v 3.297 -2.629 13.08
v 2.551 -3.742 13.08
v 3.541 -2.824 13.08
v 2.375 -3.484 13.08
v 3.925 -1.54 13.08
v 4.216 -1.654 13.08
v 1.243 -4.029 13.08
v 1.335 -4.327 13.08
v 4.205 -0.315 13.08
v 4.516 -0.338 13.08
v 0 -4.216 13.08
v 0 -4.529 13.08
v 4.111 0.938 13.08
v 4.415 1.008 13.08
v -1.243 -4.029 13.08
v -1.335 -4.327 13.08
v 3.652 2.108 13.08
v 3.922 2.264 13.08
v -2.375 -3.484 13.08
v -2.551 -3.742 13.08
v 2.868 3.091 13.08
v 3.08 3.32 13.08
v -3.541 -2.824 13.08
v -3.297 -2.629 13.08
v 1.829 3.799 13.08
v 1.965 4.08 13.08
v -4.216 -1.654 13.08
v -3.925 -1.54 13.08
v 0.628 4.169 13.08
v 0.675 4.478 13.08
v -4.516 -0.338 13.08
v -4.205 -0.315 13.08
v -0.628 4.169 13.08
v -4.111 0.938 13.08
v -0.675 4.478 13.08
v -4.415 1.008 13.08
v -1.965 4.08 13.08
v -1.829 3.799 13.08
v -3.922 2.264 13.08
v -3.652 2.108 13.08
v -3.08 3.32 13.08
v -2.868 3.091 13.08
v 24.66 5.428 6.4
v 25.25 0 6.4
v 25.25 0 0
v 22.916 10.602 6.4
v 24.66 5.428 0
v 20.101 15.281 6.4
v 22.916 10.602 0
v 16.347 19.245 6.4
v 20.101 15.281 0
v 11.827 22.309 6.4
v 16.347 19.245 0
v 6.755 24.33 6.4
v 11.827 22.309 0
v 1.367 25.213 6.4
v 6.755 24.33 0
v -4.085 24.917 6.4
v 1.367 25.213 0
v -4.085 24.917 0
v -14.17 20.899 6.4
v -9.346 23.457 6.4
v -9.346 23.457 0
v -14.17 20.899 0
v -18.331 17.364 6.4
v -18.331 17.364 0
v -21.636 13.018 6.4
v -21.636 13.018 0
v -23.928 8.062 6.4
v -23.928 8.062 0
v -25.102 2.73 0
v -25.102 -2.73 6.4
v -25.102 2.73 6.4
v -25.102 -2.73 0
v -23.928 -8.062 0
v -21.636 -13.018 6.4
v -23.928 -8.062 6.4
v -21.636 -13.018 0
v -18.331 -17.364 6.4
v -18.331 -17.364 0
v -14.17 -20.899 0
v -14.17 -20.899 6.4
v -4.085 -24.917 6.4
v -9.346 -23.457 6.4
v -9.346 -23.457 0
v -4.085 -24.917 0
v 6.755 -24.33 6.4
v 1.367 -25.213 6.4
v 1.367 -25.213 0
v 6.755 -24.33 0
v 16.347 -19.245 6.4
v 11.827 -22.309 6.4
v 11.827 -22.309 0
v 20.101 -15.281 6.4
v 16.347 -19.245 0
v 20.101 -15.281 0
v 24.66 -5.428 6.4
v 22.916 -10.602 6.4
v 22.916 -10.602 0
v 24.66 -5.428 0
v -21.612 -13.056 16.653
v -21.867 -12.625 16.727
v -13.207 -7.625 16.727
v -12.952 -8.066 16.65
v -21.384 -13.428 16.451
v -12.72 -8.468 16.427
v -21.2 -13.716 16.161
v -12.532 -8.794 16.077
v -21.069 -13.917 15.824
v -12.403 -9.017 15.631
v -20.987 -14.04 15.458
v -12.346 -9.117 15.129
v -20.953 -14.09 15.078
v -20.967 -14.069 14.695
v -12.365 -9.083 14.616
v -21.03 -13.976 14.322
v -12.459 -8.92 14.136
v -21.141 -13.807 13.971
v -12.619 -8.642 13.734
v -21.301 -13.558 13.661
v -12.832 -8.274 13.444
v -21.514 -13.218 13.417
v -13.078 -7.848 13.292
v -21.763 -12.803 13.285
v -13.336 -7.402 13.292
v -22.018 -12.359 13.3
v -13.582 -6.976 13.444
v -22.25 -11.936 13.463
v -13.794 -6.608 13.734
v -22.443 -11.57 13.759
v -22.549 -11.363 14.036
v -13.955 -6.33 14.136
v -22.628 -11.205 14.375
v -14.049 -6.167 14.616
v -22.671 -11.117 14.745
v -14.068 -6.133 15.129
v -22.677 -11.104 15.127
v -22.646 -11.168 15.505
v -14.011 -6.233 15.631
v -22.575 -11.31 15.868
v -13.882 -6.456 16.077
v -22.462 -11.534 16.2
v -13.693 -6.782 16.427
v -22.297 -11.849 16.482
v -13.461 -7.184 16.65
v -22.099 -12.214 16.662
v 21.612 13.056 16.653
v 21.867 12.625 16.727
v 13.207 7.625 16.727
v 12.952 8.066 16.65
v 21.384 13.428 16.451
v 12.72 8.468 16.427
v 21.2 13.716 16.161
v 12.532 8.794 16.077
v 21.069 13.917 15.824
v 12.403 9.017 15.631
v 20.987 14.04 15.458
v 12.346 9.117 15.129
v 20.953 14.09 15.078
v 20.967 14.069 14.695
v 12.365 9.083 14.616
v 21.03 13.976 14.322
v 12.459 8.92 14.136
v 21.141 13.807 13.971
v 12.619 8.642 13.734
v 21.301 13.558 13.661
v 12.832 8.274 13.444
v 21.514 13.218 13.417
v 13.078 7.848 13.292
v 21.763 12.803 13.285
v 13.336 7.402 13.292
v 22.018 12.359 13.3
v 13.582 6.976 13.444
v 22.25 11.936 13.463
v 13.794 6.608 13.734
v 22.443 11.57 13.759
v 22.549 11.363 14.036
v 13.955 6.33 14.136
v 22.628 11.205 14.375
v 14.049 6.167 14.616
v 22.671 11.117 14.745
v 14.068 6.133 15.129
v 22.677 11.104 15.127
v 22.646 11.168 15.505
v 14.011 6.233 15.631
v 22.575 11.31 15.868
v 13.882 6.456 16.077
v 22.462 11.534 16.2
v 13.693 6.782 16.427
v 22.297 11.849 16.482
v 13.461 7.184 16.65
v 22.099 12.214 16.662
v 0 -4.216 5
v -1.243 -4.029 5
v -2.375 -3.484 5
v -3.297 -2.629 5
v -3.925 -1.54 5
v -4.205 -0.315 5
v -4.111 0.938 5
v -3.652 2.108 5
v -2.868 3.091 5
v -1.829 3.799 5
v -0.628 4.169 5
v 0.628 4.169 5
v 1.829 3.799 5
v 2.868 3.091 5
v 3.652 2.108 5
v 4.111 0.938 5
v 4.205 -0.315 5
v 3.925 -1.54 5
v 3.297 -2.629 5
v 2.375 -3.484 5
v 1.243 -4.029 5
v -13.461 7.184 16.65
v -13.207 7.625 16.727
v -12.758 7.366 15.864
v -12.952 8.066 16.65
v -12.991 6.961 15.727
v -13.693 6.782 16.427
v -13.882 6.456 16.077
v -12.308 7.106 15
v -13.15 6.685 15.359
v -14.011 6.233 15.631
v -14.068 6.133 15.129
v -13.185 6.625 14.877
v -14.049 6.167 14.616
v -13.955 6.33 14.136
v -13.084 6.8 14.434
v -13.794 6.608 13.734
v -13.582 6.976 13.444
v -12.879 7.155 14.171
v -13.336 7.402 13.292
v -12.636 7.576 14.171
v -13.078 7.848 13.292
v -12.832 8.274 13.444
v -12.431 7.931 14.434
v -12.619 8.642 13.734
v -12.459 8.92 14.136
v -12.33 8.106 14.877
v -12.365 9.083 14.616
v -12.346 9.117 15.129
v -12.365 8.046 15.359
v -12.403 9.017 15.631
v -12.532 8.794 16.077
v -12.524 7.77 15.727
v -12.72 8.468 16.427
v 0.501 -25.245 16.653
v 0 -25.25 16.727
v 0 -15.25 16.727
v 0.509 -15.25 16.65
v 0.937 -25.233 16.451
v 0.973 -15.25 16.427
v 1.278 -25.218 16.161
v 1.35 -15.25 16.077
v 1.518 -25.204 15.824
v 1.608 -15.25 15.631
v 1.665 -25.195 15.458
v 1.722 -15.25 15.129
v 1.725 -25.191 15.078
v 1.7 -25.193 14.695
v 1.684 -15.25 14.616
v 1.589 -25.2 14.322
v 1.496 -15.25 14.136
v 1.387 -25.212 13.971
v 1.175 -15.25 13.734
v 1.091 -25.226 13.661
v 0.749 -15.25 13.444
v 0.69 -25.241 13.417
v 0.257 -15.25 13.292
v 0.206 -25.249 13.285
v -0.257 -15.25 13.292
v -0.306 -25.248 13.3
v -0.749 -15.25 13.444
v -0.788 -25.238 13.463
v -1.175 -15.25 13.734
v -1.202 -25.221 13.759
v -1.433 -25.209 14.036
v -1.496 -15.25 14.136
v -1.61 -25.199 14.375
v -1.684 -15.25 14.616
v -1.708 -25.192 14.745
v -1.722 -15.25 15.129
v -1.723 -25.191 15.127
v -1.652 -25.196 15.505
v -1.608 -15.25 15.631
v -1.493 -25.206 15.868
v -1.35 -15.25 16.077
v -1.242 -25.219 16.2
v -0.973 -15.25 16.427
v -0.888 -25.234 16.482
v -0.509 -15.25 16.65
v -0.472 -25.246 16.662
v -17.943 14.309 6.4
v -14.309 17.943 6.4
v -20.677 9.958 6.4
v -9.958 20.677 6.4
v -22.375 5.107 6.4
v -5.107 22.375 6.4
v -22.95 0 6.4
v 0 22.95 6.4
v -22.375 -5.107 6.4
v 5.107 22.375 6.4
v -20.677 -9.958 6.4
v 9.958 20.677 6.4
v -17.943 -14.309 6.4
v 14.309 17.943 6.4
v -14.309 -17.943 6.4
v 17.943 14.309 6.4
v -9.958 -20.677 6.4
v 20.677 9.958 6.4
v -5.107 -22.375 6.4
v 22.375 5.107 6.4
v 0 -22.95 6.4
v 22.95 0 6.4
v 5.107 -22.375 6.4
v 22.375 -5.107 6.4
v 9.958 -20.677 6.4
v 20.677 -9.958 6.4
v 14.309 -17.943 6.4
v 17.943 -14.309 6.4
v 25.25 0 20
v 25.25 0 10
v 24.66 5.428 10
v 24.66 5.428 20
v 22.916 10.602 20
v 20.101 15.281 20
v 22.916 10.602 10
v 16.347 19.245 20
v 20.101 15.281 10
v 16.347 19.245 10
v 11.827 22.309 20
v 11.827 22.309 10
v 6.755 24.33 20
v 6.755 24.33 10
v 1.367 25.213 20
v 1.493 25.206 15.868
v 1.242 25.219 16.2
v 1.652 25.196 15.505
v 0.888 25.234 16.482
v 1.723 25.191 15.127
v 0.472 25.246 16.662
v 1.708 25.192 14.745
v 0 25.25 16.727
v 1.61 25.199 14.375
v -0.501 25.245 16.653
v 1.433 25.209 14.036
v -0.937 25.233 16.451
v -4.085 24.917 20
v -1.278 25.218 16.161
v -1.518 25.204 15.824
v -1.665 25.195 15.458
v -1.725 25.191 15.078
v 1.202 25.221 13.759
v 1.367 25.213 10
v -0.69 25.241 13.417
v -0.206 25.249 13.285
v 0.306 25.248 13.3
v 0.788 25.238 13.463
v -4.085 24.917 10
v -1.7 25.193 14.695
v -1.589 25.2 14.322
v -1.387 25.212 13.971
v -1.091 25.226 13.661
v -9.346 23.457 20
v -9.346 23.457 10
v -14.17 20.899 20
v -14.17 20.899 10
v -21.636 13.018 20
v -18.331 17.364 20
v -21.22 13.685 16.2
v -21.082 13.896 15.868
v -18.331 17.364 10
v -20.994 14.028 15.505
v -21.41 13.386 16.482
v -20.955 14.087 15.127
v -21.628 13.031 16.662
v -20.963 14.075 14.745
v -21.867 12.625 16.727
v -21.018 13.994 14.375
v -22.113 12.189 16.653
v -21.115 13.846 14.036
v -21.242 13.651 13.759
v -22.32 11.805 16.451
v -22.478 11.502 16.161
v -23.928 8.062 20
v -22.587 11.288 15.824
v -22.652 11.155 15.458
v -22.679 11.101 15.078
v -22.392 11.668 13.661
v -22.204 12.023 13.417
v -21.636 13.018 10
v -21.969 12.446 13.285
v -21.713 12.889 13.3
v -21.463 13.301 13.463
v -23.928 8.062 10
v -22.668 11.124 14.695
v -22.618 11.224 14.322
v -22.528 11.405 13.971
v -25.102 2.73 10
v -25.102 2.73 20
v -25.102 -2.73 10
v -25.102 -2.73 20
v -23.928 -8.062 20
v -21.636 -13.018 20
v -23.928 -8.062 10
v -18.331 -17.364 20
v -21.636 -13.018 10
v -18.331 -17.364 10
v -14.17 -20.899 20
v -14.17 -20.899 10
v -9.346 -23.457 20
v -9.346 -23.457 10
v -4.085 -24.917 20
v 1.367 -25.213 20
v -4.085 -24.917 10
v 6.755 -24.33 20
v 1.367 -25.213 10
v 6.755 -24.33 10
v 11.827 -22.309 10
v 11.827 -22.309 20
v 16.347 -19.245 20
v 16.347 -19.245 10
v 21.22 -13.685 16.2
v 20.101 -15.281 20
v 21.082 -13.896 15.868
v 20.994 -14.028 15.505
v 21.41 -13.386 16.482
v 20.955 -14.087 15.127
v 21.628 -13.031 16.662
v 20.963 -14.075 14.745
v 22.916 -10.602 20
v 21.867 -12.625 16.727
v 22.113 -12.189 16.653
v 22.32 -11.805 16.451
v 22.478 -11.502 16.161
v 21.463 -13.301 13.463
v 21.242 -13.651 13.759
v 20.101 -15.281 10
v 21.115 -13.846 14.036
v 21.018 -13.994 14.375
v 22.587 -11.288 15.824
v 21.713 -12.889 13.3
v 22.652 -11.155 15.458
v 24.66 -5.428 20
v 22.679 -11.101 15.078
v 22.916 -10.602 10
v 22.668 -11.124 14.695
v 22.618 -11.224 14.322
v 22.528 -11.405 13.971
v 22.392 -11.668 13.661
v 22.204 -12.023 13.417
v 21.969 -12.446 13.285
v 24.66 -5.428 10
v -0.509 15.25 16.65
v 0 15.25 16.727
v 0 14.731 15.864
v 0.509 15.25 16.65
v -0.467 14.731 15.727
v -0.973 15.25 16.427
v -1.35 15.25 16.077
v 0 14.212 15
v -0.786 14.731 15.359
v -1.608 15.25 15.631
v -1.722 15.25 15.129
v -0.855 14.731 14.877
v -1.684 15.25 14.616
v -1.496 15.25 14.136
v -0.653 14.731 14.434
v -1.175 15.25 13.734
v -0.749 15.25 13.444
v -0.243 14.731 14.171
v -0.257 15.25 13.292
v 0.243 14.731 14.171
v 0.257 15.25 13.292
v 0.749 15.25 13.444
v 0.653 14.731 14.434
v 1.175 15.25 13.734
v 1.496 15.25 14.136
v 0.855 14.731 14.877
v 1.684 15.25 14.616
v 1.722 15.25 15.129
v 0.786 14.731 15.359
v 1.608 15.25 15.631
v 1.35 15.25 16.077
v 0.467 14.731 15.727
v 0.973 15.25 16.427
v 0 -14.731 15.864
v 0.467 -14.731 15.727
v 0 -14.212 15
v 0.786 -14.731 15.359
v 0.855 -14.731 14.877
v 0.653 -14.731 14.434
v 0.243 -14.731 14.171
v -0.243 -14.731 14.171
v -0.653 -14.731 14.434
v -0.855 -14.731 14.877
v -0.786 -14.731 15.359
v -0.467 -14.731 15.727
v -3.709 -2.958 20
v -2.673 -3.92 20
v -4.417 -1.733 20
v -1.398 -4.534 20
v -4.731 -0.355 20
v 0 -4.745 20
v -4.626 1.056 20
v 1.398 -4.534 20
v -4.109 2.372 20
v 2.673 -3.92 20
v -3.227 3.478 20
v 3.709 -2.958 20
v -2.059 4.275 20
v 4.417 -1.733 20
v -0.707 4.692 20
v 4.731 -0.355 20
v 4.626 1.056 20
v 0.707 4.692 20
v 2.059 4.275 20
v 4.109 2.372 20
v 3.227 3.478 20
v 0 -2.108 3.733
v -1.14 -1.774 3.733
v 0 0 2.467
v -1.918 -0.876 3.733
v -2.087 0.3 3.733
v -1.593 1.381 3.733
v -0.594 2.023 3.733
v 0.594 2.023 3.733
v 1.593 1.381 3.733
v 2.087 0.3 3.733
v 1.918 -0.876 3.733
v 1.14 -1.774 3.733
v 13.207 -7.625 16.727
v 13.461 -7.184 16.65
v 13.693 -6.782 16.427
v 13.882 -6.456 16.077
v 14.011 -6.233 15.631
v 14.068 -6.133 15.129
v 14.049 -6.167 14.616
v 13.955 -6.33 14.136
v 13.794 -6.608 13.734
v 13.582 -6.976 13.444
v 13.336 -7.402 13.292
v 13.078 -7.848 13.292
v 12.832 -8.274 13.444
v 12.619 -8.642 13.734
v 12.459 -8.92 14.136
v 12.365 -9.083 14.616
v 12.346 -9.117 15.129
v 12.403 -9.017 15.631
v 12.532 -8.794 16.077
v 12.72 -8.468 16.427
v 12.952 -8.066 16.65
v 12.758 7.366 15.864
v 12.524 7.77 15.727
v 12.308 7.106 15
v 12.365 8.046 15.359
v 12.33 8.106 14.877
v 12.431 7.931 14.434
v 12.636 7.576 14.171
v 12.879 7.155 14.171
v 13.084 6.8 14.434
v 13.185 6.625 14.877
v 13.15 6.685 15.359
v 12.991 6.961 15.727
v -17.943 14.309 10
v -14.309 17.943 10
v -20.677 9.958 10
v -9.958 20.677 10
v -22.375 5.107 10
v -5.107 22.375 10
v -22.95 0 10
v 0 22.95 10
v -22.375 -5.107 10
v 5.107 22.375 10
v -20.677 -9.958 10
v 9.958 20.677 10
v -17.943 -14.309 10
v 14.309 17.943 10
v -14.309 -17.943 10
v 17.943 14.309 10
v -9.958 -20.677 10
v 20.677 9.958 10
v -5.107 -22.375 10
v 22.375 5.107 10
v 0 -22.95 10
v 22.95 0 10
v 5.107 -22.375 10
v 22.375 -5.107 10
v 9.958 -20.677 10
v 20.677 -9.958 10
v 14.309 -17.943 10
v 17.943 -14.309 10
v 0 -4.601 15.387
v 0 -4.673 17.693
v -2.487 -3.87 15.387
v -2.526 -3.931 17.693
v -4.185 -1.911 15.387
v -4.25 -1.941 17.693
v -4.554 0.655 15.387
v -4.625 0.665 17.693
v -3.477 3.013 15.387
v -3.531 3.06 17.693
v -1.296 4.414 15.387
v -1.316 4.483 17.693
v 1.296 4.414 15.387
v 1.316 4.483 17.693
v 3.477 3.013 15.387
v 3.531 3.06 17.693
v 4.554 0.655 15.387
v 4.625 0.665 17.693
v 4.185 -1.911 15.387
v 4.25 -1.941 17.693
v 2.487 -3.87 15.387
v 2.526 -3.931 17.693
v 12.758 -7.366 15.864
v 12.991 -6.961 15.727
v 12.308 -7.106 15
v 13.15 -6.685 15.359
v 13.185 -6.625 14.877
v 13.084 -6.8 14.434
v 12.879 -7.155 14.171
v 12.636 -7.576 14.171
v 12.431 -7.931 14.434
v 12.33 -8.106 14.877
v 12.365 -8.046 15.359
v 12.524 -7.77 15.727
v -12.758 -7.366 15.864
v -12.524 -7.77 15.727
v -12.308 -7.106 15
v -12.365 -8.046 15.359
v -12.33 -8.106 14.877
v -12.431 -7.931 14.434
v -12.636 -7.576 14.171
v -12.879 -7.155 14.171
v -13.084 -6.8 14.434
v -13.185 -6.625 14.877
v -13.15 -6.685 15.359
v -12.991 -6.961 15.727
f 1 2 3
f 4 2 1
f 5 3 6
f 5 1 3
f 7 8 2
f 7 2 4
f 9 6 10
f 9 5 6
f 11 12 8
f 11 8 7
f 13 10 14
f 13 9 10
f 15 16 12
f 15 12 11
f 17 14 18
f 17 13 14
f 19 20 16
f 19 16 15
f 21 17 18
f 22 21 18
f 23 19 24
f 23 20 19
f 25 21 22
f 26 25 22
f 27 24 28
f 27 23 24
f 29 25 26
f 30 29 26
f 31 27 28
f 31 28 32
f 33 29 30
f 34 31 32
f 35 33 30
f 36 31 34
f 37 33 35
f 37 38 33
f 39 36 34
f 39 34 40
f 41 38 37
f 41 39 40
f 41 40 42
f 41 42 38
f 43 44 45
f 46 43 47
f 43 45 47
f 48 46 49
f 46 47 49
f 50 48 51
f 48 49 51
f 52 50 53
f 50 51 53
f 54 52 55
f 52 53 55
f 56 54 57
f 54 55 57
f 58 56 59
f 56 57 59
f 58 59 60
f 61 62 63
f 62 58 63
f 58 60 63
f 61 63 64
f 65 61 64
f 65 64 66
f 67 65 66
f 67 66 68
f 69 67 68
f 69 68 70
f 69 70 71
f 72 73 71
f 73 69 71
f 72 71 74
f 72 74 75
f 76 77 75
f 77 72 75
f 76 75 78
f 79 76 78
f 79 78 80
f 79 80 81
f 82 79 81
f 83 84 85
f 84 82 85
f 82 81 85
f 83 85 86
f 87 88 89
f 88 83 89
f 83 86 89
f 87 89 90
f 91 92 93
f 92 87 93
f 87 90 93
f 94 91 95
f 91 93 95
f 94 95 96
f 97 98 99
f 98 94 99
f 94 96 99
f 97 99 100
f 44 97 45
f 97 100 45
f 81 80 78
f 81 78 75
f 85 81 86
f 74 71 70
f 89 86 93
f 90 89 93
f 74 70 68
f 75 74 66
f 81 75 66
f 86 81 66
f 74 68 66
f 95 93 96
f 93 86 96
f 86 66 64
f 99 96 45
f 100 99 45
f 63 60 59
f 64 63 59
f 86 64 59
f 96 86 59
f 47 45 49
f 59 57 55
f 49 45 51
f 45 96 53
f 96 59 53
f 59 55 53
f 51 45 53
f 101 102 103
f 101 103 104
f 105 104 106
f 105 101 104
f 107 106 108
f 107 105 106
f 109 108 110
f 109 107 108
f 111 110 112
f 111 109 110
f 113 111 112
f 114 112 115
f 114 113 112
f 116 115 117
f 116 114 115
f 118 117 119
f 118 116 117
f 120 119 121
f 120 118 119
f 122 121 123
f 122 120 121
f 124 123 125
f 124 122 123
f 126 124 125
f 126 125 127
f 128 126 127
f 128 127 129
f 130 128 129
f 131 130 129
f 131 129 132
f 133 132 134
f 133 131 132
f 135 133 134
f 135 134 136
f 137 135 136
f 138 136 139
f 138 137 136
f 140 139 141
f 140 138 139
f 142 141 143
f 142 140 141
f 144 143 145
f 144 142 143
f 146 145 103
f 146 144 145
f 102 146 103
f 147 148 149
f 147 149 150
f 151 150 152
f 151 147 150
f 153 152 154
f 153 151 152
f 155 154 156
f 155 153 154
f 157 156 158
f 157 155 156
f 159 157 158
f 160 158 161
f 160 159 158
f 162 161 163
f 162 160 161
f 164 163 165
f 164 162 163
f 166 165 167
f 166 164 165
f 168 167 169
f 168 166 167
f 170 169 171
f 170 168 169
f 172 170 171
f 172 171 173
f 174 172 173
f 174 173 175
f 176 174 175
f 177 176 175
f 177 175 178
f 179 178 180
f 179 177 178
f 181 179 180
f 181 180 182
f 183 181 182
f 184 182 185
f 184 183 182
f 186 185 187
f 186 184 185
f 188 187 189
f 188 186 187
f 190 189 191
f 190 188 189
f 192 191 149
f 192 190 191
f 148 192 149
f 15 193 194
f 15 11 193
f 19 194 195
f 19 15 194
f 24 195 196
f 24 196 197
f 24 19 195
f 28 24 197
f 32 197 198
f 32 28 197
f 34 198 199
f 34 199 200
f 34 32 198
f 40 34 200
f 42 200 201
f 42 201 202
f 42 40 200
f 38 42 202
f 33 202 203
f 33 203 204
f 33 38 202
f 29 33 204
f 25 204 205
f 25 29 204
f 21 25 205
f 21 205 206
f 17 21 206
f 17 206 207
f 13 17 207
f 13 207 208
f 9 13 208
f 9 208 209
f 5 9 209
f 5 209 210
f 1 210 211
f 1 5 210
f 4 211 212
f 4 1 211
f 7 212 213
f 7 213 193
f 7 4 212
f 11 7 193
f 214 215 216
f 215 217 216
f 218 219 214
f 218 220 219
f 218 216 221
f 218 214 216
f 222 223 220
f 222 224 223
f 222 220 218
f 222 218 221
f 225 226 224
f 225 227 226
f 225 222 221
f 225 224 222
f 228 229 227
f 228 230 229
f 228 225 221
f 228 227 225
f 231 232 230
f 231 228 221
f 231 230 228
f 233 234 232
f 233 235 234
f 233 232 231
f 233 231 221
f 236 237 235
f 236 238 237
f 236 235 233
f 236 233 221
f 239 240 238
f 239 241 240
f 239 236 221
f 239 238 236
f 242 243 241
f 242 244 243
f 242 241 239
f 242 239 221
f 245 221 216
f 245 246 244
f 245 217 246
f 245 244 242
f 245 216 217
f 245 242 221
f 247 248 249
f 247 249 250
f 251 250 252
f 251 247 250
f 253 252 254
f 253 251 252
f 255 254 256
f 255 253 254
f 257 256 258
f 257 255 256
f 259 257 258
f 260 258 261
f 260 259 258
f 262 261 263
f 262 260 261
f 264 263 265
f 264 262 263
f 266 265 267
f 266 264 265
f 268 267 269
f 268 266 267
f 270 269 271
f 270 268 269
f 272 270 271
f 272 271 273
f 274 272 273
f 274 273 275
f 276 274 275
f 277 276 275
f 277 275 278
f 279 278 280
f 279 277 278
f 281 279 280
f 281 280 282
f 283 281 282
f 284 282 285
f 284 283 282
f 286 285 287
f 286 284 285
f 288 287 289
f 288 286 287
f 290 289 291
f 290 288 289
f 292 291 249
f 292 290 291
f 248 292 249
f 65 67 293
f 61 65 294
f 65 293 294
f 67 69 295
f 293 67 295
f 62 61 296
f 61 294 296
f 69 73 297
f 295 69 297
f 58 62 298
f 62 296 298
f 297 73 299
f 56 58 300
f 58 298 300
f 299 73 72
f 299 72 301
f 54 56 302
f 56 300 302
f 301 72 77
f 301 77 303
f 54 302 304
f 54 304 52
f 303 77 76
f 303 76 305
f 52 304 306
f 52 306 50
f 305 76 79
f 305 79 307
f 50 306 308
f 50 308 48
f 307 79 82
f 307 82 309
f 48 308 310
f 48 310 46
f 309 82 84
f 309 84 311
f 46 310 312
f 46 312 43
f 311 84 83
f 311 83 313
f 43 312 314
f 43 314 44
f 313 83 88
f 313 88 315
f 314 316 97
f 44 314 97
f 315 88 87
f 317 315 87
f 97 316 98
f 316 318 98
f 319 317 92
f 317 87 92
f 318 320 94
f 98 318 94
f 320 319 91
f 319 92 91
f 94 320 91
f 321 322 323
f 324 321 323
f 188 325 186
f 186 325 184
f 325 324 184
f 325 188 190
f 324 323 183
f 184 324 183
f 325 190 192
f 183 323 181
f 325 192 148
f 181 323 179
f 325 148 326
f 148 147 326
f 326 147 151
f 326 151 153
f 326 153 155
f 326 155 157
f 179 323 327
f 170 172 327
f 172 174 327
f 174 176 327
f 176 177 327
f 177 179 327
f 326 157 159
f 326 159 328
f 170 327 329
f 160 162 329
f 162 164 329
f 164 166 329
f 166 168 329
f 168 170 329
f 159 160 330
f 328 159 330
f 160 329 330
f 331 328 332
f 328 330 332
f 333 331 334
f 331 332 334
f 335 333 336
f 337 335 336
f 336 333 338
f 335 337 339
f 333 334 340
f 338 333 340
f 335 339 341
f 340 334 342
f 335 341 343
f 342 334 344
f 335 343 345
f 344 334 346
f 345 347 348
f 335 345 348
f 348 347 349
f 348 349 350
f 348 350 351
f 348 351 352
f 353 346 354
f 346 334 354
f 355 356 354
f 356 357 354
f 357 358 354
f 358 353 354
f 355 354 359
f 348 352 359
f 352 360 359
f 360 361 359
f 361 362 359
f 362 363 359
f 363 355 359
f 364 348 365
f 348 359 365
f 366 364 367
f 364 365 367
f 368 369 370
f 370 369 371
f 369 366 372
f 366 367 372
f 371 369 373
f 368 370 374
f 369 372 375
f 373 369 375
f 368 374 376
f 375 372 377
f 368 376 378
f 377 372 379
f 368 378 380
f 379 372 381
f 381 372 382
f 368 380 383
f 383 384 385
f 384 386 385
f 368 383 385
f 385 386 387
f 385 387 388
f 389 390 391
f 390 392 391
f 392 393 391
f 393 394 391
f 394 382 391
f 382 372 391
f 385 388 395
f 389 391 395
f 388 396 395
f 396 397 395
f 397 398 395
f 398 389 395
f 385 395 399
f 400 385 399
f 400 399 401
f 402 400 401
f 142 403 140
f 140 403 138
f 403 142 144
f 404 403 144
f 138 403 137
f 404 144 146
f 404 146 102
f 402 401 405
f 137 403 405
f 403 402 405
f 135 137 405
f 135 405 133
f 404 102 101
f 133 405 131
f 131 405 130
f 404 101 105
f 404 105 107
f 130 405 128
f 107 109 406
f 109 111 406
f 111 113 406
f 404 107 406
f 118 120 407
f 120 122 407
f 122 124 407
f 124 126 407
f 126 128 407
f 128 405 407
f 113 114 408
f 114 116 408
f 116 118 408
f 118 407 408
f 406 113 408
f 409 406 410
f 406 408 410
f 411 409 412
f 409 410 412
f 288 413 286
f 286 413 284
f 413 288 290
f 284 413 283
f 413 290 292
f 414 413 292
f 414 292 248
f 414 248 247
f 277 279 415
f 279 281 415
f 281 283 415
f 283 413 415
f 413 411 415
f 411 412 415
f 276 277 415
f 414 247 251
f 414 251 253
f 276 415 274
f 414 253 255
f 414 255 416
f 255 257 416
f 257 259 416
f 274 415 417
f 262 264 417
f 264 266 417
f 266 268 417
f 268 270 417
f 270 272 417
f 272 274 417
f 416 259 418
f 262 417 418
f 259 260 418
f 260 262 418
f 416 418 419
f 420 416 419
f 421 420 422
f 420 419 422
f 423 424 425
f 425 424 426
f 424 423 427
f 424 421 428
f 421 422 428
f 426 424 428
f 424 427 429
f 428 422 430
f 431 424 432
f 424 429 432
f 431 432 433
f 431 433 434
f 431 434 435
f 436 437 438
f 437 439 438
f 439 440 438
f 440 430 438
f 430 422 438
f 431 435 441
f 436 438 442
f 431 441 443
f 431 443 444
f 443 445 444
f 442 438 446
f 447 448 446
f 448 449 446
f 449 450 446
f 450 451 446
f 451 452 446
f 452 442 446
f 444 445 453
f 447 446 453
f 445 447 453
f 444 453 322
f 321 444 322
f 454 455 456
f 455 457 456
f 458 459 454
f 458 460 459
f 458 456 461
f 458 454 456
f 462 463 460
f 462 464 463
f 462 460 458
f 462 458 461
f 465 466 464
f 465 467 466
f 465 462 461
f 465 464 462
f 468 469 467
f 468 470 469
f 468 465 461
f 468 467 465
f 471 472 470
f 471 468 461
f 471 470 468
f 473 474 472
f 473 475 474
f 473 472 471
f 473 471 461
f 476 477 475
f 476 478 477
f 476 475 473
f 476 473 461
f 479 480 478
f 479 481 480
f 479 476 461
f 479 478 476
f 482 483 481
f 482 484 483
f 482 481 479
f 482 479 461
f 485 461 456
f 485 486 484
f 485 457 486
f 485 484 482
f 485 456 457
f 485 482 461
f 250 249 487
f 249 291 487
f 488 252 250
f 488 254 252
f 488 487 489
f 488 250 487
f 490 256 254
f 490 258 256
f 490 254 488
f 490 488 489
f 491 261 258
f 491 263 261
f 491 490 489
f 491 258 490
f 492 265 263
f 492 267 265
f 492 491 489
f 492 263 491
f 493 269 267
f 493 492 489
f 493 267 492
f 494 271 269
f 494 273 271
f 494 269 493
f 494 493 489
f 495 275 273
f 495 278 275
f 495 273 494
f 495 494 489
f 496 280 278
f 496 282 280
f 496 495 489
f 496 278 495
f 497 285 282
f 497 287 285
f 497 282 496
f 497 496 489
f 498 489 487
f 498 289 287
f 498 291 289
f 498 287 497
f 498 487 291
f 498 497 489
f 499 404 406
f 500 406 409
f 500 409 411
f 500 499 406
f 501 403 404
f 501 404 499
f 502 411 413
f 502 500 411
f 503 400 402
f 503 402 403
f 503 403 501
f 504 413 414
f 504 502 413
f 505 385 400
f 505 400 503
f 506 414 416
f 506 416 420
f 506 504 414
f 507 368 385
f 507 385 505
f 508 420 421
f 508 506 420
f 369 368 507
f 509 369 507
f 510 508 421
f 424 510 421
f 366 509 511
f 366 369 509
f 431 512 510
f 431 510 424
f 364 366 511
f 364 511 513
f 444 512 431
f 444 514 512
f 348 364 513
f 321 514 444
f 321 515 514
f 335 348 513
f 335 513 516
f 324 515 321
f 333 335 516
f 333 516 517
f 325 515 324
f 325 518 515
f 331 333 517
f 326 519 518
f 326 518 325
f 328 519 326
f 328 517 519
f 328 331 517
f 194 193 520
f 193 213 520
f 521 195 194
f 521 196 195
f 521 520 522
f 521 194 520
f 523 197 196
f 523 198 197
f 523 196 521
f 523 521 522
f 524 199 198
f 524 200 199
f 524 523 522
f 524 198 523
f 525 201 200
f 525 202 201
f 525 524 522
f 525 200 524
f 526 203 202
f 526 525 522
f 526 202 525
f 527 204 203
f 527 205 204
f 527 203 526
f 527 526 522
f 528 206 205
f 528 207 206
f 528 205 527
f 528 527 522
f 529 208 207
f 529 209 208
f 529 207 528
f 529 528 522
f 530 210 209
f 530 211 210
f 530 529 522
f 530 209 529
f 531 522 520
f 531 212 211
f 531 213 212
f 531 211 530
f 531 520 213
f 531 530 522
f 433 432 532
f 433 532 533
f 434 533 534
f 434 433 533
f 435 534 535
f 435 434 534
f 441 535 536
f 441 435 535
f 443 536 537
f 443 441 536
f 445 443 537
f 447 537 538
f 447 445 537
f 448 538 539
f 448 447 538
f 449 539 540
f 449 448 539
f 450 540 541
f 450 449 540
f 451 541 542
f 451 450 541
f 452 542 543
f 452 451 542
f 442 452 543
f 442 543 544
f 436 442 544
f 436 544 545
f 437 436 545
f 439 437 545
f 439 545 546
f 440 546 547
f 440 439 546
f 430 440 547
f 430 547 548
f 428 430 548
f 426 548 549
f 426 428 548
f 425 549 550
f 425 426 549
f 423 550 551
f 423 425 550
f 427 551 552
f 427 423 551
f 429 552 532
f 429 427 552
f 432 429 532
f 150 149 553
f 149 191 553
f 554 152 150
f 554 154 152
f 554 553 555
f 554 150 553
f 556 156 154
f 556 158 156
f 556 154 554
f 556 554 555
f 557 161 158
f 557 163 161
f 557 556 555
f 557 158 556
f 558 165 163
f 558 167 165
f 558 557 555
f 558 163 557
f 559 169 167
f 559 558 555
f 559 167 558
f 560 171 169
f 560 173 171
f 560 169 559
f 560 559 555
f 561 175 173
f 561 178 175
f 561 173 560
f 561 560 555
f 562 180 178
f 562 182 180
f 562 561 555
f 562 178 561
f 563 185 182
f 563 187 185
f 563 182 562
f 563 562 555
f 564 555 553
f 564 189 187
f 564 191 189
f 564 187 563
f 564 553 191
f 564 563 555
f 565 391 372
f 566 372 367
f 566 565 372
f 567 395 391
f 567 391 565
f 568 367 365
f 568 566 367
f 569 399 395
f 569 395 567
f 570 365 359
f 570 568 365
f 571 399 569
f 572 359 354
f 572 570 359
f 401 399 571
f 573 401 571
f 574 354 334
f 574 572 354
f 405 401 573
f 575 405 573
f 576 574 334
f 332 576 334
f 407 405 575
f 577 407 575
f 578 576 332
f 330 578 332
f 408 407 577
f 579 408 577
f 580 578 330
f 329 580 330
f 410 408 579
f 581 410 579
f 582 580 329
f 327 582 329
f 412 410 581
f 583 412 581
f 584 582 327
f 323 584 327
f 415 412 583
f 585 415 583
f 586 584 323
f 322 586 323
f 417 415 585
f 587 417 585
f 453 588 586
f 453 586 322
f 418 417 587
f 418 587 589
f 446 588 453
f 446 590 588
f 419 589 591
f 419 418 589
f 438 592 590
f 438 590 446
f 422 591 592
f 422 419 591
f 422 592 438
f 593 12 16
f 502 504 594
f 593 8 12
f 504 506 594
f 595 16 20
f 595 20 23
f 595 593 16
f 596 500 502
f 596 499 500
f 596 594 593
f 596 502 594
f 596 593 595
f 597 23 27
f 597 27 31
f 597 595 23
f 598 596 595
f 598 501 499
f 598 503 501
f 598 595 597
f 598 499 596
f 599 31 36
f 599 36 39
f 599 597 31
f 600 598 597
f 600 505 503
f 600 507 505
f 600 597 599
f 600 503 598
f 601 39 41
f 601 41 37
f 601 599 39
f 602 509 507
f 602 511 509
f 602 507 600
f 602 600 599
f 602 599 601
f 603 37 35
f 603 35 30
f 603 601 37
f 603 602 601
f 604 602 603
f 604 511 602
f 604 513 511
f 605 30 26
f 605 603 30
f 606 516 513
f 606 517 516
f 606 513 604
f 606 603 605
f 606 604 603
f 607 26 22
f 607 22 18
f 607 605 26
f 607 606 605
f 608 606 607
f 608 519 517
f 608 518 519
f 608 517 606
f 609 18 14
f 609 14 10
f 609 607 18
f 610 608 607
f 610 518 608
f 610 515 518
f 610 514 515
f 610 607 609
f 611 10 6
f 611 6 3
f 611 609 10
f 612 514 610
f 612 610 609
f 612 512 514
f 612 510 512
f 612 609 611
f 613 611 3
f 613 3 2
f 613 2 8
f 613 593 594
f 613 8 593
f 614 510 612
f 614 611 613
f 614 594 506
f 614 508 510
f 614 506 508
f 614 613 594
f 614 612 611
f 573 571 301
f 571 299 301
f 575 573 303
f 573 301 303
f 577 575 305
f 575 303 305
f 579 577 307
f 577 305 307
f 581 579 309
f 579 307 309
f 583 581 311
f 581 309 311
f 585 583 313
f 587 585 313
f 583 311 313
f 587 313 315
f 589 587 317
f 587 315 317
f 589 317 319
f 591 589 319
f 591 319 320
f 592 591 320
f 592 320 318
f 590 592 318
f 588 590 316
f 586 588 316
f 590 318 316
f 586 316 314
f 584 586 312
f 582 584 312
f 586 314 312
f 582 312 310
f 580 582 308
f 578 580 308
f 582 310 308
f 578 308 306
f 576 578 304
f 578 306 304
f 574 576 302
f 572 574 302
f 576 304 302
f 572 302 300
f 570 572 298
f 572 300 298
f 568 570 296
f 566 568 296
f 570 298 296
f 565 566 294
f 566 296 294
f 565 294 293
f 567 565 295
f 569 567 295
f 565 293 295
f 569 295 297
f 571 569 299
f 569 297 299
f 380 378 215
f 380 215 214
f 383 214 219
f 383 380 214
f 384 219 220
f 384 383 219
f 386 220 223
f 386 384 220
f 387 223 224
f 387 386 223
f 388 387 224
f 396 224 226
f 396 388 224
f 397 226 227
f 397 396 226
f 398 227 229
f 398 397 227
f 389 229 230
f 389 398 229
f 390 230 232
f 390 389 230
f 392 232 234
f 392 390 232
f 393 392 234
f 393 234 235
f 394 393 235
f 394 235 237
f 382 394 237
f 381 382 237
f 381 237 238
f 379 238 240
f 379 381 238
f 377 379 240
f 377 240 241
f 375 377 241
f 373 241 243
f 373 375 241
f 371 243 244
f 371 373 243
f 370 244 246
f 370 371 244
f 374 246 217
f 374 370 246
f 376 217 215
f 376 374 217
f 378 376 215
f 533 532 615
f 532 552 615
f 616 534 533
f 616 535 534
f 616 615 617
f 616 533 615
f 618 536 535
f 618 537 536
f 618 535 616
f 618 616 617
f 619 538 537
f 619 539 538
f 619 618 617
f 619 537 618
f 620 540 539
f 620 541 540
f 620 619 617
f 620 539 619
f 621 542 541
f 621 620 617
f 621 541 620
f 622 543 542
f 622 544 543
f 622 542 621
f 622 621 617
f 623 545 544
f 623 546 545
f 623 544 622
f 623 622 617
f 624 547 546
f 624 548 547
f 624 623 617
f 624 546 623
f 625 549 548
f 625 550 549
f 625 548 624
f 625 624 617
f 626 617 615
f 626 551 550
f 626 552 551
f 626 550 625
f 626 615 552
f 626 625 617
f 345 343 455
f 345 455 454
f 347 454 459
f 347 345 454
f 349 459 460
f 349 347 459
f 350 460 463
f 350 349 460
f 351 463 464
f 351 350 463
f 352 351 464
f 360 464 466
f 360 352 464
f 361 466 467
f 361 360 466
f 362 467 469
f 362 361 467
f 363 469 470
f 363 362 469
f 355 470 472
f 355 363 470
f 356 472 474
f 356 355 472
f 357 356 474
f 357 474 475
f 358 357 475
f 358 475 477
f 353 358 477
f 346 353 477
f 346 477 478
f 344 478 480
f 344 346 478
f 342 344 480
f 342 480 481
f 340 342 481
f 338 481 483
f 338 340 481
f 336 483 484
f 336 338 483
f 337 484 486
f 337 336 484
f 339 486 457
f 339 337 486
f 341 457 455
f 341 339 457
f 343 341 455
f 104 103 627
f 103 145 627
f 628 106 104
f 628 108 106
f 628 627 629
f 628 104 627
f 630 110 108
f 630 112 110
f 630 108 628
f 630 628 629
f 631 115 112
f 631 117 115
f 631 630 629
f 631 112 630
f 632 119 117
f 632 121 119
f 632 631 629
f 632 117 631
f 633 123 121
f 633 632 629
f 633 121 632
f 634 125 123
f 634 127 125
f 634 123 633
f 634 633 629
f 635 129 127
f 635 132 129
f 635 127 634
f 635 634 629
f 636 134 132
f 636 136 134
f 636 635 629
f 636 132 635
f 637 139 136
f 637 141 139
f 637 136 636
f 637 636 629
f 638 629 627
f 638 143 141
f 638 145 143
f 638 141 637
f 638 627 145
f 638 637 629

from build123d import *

# Parameters (mm, degrees)
SKETCH2_R           = 25.25
BOSS_EXTRUDE1_DEPTH = 20
SKETCH3_W           = 3.6
SKETCH3_H           = 2.3
CIRPATTERN1_COUNT   = 6


with BuildPart() as part:
    # Sketch2 → Boss-Extrude1 (new body)
    with BuildSketch(Plane.XY):
        Circle(SKETCH2_R)
    extrude(amount=BOSS_EXTRUDE1_DEPTH)

    # Sketch3 → Cut-Revolve1 (revolve, cut)
    with BuildSketch(Plane(origin=(0, 0, 0), x_dir=(0, 0, -1), z_dir=(1, 0, 0)), mode=Mode.PRIVATE) as cut_revolve1_sk:
        with Locations((-8.2, 24.1)):
            Rectangle(SKETCH3_W, SKETCH3_H)
    revolve(cut_revolve1_sk.sketch.rotate(Axis((0, 0, 0), (0, 0, 1)), 90), axis=Axis((0, 0, 0), (0, 0, 1)), mode=Mode.SUBTRACT)

    # Sketch7 → #8-32 Tapped Hole2 (revolve, cut)
    with BuildSketch(Plane(origin=(0, 25.25, 15), x_dir=(0, 0, 1), z_dir=(1, 0, 0))):
        Polygon((0, 0), (0, 11.037806461), (1.7272, 10), (1.7272, 0), align=None)
    f_8_32_tapped_hole2 = revolve(axis=Axis((0, 31.6, 15), (0, -1, 0)), mode=Mode.SUBTRACT)

    # CirPattern1: #8-32 Tapped Hole2 ×6 about axis
    cirpattern1_axis = Axis((0, 0, 21.768762267), (0, 0, -1))
    for i in range(1, CIRPATTERN1_COUNT):
        add(f_8_32_tapped_hole2.rotate(cirpattern1_axis, i * 360 / CIRPATTERN1_COUNT), mode=Mode.SUBTRACT)

    # Sketch11 → 1/8 NPT Tapped Hole1 (revolve, cut)
    with BuildSketch(Plane(origin=(0, 0, 20), x_dir=(0, -1, 0), z_dir=(1, 0, 0))):
        Polygon((0, 0), (0, 17.533468714), (4.2164, 15), (4.2164, 6.92), (4.528555848, 6.92), (4.744593, 0), align=None)
    revolve(axis=Axis((0, 0, 26.35), (0, 0, -1)), mode=Mode.SUBTRACT)


solid = part.part
